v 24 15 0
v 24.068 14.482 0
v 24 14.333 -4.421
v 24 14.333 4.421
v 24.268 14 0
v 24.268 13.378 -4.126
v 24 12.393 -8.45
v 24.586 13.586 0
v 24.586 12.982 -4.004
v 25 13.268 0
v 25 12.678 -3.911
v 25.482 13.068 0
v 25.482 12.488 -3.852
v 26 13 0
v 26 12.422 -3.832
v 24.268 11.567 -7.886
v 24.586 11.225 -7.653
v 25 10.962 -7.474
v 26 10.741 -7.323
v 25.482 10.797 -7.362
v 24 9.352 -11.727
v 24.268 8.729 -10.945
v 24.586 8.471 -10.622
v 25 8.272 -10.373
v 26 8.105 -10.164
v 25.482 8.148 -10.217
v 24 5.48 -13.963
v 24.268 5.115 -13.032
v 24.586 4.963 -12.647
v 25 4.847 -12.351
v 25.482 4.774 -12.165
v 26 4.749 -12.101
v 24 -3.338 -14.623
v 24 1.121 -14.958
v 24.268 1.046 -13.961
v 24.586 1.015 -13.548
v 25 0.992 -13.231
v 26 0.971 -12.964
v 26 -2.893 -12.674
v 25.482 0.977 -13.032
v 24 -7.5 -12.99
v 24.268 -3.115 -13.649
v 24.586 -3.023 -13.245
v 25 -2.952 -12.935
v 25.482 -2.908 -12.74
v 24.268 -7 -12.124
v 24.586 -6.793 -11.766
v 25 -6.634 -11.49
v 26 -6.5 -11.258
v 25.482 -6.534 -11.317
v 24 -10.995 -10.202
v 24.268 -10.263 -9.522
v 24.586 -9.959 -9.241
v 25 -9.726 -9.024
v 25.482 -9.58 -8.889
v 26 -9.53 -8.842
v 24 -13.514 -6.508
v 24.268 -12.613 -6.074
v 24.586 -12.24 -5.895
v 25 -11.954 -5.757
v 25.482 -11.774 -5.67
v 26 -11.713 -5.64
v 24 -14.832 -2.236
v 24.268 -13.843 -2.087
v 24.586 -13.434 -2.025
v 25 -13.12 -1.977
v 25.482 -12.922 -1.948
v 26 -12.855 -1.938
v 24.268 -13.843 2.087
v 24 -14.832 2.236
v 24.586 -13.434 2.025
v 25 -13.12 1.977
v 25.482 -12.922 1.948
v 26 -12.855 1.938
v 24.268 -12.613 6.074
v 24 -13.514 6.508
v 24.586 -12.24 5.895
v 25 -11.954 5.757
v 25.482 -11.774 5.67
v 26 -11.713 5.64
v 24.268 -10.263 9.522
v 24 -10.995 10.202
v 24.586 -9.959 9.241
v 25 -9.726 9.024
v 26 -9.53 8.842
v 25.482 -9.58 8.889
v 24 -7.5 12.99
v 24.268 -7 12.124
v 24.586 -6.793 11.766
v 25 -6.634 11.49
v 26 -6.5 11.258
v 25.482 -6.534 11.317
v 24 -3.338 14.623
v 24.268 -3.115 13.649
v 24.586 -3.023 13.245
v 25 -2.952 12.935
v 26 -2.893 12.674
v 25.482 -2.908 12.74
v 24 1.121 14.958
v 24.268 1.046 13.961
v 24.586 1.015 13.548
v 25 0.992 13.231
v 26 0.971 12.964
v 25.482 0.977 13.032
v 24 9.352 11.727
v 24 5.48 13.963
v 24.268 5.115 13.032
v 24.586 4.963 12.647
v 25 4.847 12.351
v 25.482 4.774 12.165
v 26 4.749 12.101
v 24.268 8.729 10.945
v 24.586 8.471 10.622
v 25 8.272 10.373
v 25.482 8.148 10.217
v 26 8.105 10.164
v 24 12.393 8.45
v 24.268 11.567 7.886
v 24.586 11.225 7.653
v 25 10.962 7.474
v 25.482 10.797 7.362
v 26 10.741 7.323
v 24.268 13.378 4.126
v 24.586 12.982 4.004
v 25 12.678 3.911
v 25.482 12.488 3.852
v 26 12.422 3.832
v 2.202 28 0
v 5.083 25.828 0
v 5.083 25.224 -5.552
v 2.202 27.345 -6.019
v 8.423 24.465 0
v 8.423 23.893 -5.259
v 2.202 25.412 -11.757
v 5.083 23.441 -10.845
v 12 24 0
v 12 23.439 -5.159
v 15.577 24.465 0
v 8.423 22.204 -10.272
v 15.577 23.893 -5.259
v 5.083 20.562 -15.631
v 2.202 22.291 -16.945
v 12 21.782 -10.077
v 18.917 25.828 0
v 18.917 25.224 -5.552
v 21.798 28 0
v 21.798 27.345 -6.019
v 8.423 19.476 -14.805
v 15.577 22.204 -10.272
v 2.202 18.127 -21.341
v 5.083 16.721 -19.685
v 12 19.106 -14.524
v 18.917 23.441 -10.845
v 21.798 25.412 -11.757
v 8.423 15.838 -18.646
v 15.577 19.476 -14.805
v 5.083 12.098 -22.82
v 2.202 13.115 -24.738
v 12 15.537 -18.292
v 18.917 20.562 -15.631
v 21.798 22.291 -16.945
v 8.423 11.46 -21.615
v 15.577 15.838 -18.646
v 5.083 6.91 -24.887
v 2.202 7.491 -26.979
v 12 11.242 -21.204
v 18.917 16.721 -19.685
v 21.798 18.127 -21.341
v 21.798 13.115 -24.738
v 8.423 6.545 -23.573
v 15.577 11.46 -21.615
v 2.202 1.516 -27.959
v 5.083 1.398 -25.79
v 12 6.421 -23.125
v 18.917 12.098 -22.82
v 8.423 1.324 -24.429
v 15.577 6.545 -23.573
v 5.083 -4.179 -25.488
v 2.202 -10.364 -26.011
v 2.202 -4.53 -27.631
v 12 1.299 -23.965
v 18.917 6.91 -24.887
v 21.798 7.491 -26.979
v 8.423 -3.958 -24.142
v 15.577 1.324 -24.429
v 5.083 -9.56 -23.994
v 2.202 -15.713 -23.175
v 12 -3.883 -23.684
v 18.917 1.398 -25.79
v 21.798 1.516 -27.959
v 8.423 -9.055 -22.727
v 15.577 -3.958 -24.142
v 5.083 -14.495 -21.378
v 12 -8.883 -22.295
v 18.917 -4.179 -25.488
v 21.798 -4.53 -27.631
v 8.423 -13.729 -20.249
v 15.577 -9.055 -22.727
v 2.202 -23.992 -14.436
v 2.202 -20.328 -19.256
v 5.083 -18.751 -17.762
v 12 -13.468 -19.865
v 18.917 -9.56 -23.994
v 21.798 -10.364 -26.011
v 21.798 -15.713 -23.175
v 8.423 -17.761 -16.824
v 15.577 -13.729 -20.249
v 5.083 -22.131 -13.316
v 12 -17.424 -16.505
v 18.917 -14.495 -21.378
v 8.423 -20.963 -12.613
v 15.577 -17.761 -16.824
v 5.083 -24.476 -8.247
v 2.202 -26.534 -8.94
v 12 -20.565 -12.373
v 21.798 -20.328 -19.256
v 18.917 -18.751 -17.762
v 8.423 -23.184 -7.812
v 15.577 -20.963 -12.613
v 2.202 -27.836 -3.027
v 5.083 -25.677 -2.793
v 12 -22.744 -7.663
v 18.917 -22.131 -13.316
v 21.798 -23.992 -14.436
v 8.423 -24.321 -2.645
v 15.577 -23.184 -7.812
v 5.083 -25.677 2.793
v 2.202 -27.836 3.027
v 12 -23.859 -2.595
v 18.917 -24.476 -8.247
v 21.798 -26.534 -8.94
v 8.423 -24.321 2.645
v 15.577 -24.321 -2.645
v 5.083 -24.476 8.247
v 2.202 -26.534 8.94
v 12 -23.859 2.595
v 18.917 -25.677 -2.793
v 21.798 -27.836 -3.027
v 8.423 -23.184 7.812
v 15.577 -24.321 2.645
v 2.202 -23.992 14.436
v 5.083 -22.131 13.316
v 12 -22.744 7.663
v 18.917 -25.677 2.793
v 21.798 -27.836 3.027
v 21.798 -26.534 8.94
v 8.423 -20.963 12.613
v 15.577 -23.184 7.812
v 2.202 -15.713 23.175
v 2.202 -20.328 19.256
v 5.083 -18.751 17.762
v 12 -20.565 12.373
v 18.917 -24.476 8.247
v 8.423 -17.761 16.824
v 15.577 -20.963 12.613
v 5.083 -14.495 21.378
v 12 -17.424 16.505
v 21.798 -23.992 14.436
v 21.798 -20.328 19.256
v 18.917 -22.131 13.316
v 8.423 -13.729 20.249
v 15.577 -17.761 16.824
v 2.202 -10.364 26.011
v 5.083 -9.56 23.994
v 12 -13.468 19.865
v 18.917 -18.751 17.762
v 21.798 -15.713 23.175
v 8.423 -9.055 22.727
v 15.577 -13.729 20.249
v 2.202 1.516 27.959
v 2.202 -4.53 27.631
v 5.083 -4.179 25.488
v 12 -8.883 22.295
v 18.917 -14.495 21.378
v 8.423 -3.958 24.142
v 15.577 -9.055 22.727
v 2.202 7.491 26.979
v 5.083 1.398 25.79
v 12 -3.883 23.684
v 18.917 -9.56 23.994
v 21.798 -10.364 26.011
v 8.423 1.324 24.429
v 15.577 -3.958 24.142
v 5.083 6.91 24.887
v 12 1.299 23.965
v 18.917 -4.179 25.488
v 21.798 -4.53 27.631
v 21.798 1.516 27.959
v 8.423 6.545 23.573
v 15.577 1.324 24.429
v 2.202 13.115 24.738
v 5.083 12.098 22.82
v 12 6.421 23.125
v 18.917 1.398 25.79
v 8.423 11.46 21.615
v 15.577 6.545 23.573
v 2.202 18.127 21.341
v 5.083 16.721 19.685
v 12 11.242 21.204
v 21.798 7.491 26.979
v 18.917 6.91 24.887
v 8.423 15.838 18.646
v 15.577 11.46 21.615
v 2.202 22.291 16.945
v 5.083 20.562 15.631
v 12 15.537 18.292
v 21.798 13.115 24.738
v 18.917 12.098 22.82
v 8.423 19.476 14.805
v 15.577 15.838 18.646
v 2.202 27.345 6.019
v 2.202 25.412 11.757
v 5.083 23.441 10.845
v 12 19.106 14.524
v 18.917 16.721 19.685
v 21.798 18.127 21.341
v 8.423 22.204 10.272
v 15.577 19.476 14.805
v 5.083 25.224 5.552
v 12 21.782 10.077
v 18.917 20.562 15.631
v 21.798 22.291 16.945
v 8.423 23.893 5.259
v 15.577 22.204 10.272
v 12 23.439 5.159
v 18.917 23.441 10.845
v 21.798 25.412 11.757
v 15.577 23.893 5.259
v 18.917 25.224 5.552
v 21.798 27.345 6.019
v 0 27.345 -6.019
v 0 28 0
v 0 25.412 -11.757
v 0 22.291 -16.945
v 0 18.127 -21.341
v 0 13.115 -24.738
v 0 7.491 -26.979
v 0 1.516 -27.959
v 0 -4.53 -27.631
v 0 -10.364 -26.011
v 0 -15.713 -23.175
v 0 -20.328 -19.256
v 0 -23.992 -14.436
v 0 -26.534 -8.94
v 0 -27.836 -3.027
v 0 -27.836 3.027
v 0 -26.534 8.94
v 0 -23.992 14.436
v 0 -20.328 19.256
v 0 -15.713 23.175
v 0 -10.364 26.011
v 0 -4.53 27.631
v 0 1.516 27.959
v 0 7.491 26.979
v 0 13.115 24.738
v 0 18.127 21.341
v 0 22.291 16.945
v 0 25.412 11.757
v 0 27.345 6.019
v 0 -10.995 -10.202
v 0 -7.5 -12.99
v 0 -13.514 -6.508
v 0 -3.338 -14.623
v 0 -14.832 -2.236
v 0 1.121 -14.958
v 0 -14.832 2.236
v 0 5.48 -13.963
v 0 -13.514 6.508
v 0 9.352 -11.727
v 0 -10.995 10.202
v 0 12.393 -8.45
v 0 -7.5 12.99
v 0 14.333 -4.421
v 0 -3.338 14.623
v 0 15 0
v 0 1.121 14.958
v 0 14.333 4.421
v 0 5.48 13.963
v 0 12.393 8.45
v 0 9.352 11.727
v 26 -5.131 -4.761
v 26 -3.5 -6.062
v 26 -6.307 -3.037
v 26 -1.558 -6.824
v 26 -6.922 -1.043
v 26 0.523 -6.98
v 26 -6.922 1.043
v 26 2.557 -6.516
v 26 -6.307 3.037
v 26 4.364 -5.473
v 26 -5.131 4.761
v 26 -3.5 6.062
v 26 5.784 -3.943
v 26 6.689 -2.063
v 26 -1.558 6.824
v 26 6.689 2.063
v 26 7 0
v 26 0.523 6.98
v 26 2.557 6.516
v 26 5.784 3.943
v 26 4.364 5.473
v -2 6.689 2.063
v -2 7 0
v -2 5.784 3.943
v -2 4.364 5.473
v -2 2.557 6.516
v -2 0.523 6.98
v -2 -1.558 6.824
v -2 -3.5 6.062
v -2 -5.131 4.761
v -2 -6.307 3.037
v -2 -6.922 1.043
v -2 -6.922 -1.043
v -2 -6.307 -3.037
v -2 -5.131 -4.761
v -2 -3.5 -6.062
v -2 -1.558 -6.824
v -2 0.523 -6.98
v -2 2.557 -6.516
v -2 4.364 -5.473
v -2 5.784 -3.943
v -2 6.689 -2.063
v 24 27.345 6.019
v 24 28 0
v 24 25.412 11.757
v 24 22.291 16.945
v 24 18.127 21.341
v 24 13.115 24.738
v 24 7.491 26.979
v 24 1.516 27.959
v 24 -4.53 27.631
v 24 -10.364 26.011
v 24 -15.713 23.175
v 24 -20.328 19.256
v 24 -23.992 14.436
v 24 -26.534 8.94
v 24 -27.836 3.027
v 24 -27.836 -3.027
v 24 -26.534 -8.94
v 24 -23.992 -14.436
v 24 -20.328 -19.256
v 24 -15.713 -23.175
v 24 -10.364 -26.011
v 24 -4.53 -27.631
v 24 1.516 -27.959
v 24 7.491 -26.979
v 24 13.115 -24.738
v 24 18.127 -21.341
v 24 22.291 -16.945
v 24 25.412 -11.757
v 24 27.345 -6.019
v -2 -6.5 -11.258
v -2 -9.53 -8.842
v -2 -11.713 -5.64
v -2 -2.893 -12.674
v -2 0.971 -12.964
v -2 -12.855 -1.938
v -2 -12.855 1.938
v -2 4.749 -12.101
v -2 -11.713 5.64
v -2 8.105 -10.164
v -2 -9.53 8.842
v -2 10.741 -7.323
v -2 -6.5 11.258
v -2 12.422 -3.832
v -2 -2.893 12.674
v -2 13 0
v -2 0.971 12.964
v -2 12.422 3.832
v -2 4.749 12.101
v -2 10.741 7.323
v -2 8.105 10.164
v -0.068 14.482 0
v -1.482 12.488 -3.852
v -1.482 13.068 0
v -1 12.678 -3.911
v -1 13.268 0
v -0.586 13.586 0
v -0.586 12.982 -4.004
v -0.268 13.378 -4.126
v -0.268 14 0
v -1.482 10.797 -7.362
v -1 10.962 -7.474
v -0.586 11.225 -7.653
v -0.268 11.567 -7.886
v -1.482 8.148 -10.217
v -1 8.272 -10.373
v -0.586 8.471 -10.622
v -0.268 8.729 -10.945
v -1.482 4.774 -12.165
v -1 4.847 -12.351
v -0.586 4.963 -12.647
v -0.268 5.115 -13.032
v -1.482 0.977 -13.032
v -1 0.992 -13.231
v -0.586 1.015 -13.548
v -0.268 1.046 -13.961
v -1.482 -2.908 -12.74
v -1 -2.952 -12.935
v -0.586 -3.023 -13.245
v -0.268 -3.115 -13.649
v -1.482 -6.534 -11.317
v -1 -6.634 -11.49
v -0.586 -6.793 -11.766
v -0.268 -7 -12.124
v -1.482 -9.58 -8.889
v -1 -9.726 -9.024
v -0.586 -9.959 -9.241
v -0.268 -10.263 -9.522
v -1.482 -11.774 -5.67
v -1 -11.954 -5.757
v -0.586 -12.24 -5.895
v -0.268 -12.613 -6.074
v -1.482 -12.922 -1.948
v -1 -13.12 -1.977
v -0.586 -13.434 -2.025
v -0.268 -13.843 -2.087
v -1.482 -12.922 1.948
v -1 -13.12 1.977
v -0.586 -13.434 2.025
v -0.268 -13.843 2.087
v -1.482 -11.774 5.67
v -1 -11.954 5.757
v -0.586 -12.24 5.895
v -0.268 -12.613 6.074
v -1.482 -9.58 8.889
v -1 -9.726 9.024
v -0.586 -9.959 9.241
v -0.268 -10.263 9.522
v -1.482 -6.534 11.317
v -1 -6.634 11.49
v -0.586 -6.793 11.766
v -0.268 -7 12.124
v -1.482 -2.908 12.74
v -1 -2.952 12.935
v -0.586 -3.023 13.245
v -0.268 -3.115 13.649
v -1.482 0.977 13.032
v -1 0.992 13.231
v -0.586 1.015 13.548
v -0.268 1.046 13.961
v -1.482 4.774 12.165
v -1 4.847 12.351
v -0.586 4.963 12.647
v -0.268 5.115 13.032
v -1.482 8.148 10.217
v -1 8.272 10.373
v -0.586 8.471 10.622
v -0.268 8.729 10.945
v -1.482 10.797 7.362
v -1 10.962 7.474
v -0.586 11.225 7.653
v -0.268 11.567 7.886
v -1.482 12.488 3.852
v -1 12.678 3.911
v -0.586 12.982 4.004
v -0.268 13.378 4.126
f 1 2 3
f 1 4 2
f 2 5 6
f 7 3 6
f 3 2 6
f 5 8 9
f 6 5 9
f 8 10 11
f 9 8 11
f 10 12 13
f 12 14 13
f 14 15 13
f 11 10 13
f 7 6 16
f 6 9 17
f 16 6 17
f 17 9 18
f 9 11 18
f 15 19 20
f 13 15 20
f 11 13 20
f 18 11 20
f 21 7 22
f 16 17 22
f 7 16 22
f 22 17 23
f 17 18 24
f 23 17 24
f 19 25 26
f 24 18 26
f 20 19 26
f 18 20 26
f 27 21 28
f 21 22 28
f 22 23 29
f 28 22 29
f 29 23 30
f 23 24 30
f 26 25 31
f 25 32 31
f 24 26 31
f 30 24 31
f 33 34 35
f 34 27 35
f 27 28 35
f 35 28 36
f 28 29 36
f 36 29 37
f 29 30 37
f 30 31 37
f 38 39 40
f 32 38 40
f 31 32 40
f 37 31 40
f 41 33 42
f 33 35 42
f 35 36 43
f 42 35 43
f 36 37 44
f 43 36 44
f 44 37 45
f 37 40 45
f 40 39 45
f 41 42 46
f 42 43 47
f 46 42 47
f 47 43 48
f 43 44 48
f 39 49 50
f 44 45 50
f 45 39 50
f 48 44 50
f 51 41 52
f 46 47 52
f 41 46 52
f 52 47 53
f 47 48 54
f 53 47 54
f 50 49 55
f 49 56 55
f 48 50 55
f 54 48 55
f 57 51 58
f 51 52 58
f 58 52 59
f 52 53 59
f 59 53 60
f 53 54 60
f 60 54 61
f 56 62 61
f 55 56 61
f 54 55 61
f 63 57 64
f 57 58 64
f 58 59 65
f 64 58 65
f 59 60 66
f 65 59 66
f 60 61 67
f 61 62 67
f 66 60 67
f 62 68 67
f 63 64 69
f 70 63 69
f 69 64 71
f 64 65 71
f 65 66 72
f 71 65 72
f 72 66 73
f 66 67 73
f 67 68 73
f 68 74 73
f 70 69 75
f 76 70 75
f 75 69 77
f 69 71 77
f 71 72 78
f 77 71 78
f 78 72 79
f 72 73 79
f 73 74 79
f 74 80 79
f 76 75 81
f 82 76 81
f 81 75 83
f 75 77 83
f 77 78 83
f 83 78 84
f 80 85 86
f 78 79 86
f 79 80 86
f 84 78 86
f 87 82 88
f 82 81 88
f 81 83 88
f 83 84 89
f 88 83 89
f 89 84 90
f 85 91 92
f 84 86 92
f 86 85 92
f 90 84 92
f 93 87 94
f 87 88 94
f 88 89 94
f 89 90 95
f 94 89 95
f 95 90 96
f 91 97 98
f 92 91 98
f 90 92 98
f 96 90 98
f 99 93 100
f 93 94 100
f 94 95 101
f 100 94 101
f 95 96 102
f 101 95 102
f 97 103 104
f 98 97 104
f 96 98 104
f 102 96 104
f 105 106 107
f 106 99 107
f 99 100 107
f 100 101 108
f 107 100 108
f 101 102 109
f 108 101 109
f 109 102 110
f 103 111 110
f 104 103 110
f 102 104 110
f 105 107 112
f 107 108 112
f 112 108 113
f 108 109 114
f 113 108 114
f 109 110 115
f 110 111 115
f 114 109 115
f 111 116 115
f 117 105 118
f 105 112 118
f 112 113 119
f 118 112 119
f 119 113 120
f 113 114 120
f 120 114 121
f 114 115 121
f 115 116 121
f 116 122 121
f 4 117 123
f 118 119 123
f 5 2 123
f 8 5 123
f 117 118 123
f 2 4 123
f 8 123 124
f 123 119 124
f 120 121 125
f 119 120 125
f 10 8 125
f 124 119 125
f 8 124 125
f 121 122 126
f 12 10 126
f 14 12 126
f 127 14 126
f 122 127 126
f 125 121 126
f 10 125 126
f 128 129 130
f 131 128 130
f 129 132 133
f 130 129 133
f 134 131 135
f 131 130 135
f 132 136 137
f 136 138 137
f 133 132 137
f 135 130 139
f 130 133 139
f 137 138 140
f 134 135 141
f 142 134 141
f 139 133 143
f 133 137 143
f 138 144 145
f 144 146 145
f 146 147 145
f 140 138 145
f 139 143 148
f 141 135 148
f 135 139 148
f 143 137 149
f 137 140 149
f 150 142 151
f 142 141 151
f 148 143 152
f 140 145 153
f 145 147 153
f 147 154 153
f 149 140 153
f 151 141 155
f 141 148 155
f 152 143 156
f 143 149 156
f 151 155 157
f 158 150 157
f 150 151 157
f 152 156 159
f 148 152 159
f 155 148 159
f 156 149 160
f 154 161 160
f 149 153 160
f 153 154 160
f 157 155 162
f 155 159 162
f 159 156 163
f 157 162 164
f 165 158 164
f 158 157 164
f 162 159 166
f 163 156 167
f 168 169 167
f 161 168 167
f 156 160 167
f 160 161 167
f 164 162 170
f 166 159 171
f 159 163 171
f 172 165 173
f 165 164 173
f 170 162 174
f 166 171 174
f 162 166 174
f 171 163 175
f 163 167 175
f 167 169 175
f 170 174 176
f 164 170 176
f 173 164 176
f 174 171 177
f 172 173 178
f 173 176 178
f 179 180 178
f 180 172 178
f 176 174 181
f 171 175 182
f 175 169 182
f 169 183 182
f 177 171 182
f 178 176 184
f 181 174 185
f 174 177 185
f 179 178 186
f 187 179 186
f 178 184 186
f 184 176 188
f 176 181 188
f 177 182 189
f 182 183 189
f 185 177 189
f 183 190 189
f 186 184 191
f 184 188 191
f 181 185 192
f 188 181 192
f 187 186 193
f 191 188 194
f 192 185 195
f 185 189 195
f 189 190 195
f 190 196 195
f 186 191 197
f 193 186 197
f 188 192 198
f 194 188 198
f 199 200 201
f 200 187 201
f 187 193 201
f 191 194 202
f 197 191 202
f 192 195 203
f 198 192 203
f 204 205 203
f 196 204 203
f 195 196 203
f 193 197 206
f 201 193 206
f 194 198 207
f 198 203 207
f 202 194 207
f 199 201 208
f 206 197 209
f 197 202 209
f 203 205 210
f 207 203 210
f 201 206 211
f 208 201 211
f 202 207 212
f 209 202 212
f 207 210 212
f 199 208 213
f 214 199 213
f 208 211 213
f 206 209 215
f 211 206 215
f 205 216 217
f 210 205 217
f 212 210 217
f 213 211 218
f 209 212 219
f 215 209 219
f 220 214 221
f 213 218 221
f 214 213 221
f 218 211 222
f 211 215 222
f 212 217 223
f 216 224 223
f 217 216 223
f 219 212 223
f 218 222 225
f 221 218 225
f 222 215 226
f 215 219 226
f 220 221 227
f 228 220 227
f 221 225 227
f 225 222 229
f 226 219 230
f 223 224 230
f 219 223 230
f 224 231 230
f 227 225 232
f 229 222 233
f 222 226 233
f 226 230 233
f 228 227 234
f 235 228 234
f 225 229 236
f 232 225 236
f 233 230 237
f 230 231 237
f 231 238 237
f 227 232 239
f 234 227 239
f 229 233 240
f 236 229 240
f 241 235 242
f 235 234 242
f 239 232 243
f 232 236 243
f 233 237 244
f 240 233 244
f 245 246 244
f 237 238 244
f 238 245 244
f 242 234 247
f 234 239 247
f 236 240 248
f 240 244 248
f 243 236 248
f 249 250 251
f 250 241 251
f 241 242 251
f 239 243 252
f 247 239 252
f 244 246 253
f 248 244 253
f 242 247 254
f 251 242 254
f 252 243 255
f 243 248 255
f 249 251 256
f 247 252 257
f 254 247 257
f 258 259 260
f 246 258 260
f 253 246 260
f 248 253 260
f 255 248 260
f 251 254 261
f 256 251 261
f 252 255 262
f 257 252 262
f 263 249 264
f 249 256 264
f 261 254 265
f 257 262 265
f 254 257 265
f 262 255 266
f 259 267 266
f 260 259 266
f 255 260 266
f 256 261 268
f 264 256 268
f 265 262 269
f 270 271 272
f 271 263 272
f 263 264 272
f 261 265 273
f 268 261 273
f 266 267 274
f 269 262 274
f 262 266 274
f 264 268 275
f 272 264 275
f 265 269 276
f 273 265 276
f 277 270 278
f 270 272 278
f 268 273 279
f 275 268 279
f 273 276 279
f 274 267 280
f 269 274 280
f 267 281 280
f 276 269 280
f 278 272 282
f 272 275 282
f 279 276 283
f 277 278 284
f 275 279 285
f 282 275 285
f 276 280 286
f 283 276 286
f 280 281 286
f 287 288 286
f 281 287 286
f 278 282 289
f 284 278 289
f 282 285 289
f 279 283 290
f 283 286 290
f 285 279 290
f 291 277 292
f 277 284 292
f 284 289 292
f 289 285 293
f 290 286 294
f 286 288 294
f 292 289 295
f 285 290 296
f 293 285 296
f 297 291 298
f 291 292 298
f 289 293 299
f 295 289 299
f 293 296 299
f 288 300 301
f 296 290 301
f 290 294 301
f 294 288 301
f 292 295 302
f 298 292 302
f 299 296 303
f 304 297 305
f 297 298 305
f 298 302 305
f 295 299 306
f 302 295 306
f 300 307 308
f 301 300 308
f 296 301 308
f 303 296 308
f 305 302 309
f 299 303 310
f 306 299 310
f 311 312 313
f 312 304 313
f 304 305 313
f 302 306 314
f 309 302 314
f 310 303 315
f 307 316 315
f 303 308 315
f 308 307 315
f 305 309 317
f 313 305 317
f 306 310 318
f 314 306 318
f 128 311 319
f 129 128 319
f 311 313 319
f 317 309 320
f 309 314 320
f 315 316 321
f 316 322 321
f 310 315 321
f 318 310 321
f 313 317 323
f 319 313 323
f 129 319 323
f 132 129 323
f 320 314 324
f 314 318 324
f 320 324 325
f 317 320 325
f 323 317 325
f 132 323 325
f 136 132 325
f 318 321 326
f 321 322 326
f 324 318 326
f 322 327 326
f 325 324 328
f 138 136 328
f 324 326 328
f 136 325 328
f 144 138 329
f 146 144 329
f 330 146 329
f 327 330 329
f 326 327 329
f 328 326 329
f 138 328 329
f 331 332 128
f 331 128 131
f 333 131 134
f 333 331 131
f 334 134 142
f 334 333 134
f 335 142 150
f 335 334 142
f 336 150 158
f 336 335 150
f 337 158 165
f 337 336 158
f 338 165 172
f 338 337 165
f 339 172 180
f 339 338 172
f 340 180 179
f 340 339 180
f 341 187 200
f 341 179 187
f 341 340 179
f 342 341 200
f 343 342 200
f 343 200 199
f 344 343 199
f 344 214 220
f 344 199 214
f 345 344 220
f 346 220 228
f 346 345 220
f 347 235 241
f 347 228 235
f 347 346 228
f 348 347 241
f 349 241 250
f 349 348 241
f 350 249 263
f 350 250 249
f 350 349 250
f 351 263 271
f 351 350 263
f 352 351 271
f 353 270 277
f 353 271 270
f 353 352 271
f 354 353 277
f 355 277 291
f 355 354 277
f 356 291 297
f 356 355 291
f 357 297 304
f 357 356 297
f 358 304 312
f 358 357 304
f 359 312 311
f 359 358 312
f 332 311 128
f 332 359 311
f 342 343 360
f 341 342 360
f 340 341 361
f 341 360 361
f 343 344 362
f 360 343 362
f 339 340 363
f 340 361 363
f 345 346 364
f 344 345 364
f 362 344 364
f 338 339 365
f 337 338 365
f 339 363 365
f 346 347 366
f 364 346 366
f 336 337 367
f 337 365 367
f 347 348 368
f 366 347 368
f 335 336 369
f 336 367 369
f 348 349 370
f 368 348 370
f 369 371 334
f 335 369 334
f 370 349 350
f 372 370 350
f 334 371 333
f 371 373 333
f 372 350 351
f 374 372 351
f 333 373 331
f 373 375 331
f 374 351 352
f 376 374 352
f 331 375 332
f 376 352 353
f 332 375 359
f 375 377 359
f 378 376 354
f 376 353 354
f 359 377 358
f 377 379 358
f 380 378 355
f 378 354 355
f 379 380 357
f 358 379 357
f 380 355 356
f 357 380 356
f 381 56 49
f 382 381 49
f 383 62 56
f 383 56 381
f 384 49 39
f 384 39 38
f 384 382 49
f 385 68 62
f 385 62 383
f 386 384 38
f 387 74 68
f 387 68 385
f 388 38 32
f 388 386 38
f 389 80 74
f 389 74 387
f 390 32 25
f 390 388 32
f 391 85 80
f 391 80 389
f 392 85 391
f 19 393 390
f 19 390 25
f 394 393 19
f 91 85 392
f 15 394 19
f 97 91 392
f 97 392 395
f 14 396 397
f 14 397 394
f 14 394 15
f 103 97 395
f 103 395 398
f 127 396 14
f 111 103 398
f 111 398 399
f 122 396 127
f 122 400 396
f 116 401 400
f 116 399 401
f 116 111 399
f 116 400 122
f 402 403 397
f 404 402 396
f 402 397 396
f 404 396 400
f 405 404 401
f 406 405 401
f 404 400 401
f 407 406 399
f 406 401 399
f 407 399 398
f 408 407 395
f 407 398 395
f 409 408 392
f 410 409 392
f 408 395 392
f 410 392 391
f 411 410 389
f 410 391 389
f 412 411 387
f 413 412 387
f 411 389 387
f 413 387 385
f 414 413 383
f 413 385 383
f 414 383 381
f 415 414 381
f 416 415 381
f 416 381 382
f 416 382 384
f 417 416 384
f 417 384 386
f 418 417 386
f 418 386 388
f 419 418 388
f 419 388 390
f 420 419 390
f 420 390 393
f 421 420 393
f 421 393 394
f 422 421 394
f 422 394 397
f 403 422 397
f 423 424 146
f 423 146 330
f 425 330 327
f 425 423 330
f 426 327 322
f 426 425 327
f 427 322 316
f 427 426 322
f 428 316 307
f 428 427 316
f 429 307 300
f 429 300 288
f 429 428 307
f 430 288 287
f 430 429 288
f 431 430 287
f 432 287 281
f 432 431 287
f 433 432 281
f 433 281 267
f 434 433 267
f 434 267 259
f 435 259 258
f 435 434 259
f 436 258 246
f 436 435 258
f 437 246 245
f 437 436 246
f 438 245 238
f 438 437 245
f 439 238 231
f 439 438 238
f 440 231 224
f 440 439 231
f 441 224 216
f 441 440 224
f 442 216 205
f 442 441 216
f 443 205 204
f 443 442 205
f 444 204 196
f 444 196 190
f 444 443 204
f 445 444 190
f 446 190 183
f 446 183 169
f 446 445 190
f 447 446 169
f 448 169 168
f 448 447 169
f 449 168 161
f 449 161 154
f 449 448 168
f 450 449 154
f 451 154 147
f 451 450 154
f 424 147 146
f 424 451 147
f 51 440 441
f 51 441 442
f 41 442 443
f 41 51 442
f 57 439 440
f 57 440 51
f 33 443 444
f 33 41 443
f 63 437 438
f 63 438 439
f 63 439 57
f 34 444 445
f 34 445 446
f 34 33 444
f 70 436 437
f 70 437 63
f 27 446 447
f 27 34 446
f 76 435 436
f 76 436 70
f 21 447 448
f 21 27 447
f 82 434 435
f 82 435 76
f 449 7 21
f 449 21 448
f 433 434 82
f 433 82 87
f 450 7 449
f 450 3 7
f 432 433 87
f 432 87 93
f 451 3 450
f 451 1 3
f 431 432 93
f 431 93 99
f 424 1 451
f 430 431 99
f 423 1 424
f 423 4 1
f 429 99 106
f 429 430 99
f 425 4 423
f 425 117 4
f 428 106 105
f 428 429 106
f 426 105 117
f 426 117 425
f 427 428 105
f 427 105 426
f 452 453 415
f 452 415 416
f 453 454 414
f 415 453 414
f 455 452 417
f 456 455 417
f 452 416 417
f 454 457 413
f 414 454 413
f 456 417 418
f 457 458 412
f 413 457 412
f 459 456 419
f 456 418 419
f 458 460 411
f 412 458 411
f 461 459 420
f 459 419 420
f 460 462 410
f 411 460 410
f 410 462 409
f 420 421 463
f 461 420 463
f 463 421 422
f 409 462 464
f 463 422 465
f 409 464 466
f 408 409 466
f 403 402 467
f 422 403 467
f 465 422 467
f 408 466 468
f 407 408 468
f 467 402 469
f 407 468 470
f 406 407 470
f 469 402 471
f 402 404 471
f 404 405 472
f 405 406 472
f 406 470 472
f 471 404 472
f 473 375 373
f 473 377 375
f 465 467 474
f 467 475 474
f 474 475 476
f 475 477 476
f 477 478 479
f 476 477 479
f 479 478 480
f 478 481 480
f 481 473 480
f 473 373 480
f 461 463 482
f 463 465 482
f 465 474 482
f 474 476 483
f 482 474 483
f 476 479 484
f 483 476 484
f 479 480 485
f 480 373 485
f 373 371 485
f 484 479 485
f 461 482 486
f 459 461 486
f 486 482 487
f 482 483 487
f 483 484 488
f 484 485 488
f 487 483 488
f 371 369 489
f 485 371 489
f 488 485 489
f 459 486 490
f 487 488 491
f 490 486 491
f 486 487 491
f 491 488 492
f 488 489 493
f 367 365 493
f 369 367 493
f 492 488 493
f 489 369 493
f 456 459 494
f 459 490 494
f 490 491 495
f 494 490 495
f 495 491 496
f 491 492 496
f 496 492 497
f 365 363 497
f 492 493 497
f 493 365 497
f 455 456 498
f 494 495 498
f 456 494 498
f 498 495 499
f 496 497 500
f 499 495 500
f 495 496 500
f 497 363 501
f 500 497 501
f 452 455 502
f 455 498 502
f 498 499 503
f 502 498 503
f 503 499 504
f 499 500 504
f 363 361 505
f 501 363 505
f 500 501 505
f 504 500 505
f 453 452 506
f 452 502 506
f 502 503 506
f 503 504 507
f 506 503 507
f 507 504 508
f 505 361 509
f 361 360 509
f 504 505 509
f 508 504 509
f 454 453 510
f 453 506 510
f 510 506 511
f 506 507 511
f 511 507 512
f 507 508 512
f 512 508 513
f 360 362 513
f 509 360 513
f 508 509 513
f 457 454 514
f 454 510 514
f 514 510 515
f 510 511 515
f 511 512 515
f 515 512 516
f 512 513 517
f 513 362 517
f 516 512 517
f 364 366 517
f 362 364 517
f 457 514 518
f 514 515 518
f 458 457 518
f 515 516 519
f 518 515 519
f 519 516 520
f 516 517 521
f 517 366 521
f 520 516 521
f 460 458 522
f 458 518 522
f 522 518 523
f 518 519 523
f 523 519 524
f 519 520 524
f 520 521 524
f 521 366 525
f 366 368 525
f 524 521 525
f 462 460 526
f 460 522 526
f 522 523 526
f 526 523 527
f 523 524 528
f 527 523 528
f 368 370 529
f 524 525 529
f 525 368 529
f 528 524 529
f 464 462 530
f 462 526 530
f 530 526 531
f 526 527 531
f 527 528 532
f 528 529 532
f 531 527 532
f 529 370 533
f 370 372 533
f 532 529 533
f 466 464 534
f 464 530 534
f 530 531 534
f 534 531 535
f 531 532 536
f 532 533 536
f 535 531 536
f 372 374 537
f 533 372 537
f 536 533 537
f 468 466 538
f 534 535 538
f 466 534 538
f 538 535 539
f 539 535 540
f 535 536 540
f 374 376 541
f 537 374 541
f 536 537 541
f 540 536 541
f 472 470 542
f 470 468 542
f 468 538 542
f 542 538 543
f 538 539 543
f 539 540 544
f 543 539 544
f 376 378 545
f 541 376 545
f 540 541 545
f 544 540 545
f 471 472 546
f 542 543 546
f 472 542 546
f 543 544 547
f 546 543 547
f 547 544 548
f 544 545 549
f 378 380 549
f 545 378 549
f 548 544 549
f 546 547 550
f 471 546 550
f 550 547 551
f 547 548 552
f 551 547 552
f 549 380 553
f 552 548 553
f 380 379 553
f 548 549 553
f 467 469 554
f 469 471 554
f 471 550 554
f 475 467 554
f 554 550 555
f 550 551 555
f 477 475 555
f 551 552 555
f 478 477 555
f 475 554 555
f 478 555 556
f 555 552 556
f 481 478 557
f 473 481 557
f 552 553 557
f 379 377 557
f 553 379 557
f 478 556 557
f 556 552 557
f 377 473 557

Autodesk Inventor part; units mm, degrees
ref_plane "YZ Plane" through (0, 0, 0) normal (1, 0, 0) x (0, 1, 0)
ref_plane "XZ Plane" through (0, 0, 0) normal (0, 1, 0) x (-1, 0, 0)
ref_plane "XY Plane" through (0, 0, 0) normal (0, 0, 1) x (1, 0, 0)
sketch "Sketch1" plane through (0, 0, 0) normal (0, 0, 1) x (1, 0, 0)
  line L0 (-2, 7) -> (26, 7)
  line L1 (-13.8022, 0) -> (14.1978, 0) construction
  line L2 (26, 7) -> (26, 13)
  line L3 (26, 13) -> (24, 13)
  line L4 (24, 13) -> (24, 28)
  line L5 (0, 28) -> (0, 13)
  line L6 (0, 13) -> (-2, 13)
  line L7 (-2, 13) -> (-2, 7)
  arc A0 (2.202, 28) -> (21.798, 28) centre (12, 38) ccw
  arc A1 (2.202, 28) -> (21.798, 28) centre (12, 38) ccw
  line L8 (2.202, 28) -> (0, 28)
  line L9 (21.798, 28) -> (24, 28)
  point P0 (0, 0)
  dimension "d0" = 28
  dimension "d1" = 14
  dimension "d2" = 26
  dimension "d3" = 2
  dimension "d5" = 24
  dimension "d11" = 14
  dimension "d12" = 56
  dimension "d13" = 76
revolve "Revolution1" add sketch "Sketch1" angle 360 about axis through (-13.8022, 0, 0) along (1, 0, 0)
fillet "Fillet1" radius 2 2 edges at (24, -13, 0) (0, -13, 0)
properties part number "parte2_revolucion"
